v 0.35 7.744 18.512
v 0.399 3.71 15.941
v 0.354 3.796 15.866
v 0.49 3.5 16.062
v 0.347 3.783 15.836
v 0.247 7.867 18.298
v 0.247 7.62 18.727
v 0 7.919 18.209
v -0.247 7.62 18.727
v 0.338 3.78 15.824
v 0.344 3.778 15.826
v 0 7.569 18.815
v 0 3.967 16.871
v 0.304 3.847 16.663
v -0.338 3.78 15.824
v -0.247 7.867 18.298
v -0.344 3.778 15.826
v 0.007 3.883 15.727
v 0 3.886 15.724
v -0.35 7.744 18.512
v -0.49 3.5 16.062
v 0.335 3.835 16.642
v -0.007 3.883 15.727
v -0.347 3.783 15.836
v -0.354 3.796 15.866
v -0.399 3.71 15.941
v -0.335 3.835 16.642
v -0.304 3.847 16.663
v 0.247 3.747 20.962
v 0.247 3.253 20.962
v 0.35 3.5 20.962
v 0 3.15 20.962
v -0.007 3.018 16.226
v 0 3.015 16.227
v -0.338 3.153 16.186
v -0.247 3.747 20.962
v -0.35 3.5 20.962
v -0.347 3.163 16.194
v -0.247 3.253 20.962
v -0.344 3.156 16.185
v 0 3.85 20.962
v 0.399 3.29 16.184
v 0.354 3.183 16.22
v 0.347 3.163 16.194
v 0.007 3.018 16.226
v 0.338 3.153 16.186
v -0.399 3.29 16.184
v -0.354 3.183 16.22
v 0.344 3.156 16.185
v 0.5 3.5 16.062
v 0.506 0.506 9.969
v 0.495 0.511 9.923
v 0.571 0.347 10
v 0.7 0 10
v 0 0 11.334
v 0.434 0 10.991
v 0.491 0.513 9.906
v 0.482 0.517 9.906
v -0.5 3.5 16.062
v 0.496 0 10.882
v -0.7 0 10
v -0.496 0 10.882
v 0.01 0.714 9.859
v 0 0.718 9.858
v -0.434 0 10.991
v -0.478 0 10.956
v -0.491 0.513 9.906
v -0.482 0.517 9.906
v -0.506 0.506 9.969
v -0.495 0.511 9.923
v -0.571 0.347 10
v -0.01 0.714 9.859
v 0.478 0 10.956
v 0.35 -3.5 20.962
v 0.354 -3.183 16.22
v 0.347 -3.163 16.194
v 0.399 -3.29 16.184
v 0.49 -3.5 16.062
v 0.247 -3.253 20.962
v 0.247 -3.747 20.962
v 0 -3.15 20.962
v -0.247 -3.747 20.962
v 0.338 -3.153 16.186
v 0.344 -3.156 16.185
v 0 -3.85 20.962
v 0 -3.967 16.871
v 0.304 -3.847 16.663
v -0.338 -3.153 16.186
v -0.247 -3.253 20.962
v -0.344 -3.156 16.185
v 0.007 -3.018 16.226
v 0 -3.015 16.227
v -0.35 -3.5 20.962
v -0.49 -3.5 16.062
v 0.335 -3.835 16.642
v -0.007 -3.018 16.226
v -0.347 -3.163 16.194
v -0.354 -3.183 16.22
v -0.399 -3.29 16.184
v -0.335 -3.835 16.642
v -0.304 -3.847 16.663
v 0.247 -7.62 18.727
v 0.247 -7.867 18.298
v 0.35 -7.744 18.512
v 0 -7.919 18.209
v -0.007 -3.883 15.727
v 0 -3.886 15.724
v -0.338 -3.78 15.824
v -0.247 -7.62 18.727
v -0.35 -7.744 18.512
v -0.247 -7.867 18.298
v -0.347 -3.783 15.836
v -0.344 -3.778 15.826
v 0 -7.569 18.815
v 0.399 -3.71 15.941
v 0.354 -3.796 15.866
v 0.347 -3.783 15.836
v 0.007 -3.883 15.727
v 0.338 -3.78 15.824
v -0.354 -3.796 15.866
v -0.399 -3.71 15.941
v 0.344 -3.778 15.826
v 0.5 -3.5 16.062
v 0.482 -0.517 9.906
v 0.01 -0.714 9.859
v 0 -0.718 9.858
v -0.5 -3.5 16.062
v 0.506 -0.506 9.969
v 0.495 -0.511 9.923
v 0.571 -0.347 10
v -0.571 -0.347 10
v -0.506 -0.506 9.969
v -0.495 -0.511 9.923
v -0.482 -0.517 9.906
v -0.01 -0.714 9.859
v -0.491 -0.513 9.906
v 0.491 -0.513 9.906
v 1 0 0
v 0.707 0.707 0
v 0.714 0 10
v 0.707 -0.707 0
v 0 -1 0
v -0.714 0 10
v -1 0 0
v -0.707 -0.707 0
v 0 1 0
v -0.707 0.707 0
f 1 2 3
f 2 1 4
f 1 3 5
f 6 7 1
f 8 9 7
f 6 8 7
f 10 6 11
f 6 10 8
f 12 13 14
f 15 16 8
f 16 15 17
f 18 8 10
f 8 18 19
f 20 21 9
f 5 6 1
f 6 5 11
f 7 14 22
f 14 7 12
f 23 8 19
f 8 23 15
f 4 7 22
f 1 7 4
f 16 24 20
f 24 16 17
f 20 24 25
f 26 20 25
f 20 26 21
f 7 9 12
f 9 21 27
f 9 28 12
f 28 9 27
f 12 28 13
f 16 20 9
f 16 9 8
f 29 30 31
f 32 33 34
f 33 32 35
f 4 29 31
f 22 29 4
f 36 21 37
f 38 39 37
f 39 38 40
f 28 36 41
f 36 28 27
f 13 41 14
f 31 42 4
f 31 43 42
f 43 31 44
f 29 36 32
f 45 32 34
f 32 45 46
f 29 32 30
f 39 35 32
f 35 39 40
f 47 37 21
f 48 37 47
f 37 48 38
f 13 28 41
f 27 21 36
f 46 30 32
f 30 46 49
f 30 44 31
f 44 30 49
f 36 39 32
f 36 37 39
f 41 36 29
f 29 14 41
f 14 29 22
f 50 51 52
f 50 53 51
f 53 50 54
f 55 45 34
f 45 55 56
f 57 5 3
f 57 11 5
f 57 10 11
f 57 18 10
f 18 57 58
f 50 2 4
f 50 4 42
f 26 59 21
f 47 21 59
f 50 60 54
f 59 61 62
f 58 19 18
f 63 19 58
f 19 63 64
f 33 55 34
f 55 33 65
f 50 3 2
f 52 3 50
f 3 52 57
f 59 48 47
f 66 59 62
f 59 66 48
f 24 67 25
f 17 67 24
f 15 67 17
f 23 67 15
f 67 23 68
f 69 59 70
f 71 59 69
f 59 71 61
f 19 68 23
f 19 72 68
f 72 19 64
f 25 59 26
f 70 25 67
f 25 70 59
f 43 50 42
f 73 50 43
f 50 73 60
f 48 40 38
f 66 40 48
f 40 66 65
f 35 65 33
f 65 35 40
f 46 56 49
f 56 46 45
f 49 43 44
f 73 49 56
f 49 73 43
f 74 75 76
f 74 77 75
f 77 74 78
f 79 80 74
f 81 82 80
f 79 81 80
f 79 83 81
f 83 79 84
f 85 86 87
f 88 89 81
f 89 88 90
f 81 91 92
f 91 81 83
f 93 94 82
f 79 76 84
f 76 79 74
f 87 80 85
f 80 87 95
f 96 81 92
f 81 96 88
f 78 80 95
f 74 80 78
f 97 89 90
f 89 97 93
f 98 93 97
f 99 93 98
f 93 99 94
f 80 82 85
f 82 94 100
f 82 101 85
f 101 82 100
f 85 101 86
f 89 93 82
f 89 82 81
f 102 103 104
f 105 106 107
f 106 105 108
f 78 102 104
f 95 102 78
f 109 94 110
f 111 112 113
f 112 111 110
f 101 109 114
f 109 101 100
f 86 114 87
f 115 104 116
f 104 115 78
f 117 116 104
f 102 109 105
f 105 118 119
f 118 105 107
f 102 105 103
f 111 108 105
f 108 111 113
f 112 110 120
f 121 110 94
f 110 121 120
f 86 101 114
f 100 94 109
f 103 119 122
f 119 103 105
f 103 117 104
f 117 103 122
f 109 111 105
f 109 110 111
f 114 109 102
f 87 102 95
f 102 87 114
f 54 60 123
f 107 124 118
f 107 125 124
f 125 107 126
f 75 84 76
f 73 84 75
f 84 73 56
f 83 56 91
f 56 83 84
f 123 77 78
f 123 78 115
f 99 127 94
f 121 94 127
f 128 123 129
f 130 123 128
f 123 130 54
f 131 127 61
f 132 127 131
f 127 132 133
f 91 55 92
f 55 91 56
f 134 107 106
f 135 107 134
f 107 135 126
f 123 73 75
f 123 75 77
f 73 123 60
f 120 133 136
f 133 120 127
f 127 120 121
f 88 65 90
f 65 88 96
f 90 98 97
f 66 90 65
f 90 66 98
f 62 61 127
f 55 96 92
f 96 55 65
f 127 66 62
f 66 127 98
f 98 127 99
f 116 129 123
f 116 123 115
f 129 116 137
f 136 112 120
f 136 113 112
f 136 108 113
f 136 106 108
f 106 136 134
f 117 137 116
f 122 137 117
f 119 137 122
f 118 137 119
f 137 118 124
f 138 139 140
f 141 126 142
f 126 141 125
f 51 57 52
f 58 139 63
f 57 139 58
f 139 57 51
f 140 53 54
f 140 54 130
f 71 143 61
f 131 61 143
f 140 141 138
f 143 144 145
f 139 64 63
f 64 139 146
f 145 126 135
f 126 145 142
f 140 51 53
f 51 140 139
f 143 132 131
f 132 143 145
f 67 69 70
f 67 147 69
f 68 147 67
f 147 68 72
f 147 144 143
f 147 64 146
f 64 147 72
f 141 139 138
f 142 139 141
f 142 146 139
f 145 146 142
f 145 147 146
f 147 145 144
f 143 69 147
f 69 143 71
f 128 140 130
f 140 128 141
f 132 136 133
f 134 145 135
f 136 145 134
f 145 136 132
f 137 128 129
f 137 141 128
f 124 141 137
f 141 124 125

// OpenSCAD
module branch(len, depth) {
  cylinder(h = len, r1 = len / 10, r2 = len / 14, $fn = 8);
  if (depth > 0)
    translate([0, 0, len])
      for (a = [-30, 30])
        rotate([a, 0, 0]) branch(len * 0.7, depth - 1);
}
branch(10, 2);
